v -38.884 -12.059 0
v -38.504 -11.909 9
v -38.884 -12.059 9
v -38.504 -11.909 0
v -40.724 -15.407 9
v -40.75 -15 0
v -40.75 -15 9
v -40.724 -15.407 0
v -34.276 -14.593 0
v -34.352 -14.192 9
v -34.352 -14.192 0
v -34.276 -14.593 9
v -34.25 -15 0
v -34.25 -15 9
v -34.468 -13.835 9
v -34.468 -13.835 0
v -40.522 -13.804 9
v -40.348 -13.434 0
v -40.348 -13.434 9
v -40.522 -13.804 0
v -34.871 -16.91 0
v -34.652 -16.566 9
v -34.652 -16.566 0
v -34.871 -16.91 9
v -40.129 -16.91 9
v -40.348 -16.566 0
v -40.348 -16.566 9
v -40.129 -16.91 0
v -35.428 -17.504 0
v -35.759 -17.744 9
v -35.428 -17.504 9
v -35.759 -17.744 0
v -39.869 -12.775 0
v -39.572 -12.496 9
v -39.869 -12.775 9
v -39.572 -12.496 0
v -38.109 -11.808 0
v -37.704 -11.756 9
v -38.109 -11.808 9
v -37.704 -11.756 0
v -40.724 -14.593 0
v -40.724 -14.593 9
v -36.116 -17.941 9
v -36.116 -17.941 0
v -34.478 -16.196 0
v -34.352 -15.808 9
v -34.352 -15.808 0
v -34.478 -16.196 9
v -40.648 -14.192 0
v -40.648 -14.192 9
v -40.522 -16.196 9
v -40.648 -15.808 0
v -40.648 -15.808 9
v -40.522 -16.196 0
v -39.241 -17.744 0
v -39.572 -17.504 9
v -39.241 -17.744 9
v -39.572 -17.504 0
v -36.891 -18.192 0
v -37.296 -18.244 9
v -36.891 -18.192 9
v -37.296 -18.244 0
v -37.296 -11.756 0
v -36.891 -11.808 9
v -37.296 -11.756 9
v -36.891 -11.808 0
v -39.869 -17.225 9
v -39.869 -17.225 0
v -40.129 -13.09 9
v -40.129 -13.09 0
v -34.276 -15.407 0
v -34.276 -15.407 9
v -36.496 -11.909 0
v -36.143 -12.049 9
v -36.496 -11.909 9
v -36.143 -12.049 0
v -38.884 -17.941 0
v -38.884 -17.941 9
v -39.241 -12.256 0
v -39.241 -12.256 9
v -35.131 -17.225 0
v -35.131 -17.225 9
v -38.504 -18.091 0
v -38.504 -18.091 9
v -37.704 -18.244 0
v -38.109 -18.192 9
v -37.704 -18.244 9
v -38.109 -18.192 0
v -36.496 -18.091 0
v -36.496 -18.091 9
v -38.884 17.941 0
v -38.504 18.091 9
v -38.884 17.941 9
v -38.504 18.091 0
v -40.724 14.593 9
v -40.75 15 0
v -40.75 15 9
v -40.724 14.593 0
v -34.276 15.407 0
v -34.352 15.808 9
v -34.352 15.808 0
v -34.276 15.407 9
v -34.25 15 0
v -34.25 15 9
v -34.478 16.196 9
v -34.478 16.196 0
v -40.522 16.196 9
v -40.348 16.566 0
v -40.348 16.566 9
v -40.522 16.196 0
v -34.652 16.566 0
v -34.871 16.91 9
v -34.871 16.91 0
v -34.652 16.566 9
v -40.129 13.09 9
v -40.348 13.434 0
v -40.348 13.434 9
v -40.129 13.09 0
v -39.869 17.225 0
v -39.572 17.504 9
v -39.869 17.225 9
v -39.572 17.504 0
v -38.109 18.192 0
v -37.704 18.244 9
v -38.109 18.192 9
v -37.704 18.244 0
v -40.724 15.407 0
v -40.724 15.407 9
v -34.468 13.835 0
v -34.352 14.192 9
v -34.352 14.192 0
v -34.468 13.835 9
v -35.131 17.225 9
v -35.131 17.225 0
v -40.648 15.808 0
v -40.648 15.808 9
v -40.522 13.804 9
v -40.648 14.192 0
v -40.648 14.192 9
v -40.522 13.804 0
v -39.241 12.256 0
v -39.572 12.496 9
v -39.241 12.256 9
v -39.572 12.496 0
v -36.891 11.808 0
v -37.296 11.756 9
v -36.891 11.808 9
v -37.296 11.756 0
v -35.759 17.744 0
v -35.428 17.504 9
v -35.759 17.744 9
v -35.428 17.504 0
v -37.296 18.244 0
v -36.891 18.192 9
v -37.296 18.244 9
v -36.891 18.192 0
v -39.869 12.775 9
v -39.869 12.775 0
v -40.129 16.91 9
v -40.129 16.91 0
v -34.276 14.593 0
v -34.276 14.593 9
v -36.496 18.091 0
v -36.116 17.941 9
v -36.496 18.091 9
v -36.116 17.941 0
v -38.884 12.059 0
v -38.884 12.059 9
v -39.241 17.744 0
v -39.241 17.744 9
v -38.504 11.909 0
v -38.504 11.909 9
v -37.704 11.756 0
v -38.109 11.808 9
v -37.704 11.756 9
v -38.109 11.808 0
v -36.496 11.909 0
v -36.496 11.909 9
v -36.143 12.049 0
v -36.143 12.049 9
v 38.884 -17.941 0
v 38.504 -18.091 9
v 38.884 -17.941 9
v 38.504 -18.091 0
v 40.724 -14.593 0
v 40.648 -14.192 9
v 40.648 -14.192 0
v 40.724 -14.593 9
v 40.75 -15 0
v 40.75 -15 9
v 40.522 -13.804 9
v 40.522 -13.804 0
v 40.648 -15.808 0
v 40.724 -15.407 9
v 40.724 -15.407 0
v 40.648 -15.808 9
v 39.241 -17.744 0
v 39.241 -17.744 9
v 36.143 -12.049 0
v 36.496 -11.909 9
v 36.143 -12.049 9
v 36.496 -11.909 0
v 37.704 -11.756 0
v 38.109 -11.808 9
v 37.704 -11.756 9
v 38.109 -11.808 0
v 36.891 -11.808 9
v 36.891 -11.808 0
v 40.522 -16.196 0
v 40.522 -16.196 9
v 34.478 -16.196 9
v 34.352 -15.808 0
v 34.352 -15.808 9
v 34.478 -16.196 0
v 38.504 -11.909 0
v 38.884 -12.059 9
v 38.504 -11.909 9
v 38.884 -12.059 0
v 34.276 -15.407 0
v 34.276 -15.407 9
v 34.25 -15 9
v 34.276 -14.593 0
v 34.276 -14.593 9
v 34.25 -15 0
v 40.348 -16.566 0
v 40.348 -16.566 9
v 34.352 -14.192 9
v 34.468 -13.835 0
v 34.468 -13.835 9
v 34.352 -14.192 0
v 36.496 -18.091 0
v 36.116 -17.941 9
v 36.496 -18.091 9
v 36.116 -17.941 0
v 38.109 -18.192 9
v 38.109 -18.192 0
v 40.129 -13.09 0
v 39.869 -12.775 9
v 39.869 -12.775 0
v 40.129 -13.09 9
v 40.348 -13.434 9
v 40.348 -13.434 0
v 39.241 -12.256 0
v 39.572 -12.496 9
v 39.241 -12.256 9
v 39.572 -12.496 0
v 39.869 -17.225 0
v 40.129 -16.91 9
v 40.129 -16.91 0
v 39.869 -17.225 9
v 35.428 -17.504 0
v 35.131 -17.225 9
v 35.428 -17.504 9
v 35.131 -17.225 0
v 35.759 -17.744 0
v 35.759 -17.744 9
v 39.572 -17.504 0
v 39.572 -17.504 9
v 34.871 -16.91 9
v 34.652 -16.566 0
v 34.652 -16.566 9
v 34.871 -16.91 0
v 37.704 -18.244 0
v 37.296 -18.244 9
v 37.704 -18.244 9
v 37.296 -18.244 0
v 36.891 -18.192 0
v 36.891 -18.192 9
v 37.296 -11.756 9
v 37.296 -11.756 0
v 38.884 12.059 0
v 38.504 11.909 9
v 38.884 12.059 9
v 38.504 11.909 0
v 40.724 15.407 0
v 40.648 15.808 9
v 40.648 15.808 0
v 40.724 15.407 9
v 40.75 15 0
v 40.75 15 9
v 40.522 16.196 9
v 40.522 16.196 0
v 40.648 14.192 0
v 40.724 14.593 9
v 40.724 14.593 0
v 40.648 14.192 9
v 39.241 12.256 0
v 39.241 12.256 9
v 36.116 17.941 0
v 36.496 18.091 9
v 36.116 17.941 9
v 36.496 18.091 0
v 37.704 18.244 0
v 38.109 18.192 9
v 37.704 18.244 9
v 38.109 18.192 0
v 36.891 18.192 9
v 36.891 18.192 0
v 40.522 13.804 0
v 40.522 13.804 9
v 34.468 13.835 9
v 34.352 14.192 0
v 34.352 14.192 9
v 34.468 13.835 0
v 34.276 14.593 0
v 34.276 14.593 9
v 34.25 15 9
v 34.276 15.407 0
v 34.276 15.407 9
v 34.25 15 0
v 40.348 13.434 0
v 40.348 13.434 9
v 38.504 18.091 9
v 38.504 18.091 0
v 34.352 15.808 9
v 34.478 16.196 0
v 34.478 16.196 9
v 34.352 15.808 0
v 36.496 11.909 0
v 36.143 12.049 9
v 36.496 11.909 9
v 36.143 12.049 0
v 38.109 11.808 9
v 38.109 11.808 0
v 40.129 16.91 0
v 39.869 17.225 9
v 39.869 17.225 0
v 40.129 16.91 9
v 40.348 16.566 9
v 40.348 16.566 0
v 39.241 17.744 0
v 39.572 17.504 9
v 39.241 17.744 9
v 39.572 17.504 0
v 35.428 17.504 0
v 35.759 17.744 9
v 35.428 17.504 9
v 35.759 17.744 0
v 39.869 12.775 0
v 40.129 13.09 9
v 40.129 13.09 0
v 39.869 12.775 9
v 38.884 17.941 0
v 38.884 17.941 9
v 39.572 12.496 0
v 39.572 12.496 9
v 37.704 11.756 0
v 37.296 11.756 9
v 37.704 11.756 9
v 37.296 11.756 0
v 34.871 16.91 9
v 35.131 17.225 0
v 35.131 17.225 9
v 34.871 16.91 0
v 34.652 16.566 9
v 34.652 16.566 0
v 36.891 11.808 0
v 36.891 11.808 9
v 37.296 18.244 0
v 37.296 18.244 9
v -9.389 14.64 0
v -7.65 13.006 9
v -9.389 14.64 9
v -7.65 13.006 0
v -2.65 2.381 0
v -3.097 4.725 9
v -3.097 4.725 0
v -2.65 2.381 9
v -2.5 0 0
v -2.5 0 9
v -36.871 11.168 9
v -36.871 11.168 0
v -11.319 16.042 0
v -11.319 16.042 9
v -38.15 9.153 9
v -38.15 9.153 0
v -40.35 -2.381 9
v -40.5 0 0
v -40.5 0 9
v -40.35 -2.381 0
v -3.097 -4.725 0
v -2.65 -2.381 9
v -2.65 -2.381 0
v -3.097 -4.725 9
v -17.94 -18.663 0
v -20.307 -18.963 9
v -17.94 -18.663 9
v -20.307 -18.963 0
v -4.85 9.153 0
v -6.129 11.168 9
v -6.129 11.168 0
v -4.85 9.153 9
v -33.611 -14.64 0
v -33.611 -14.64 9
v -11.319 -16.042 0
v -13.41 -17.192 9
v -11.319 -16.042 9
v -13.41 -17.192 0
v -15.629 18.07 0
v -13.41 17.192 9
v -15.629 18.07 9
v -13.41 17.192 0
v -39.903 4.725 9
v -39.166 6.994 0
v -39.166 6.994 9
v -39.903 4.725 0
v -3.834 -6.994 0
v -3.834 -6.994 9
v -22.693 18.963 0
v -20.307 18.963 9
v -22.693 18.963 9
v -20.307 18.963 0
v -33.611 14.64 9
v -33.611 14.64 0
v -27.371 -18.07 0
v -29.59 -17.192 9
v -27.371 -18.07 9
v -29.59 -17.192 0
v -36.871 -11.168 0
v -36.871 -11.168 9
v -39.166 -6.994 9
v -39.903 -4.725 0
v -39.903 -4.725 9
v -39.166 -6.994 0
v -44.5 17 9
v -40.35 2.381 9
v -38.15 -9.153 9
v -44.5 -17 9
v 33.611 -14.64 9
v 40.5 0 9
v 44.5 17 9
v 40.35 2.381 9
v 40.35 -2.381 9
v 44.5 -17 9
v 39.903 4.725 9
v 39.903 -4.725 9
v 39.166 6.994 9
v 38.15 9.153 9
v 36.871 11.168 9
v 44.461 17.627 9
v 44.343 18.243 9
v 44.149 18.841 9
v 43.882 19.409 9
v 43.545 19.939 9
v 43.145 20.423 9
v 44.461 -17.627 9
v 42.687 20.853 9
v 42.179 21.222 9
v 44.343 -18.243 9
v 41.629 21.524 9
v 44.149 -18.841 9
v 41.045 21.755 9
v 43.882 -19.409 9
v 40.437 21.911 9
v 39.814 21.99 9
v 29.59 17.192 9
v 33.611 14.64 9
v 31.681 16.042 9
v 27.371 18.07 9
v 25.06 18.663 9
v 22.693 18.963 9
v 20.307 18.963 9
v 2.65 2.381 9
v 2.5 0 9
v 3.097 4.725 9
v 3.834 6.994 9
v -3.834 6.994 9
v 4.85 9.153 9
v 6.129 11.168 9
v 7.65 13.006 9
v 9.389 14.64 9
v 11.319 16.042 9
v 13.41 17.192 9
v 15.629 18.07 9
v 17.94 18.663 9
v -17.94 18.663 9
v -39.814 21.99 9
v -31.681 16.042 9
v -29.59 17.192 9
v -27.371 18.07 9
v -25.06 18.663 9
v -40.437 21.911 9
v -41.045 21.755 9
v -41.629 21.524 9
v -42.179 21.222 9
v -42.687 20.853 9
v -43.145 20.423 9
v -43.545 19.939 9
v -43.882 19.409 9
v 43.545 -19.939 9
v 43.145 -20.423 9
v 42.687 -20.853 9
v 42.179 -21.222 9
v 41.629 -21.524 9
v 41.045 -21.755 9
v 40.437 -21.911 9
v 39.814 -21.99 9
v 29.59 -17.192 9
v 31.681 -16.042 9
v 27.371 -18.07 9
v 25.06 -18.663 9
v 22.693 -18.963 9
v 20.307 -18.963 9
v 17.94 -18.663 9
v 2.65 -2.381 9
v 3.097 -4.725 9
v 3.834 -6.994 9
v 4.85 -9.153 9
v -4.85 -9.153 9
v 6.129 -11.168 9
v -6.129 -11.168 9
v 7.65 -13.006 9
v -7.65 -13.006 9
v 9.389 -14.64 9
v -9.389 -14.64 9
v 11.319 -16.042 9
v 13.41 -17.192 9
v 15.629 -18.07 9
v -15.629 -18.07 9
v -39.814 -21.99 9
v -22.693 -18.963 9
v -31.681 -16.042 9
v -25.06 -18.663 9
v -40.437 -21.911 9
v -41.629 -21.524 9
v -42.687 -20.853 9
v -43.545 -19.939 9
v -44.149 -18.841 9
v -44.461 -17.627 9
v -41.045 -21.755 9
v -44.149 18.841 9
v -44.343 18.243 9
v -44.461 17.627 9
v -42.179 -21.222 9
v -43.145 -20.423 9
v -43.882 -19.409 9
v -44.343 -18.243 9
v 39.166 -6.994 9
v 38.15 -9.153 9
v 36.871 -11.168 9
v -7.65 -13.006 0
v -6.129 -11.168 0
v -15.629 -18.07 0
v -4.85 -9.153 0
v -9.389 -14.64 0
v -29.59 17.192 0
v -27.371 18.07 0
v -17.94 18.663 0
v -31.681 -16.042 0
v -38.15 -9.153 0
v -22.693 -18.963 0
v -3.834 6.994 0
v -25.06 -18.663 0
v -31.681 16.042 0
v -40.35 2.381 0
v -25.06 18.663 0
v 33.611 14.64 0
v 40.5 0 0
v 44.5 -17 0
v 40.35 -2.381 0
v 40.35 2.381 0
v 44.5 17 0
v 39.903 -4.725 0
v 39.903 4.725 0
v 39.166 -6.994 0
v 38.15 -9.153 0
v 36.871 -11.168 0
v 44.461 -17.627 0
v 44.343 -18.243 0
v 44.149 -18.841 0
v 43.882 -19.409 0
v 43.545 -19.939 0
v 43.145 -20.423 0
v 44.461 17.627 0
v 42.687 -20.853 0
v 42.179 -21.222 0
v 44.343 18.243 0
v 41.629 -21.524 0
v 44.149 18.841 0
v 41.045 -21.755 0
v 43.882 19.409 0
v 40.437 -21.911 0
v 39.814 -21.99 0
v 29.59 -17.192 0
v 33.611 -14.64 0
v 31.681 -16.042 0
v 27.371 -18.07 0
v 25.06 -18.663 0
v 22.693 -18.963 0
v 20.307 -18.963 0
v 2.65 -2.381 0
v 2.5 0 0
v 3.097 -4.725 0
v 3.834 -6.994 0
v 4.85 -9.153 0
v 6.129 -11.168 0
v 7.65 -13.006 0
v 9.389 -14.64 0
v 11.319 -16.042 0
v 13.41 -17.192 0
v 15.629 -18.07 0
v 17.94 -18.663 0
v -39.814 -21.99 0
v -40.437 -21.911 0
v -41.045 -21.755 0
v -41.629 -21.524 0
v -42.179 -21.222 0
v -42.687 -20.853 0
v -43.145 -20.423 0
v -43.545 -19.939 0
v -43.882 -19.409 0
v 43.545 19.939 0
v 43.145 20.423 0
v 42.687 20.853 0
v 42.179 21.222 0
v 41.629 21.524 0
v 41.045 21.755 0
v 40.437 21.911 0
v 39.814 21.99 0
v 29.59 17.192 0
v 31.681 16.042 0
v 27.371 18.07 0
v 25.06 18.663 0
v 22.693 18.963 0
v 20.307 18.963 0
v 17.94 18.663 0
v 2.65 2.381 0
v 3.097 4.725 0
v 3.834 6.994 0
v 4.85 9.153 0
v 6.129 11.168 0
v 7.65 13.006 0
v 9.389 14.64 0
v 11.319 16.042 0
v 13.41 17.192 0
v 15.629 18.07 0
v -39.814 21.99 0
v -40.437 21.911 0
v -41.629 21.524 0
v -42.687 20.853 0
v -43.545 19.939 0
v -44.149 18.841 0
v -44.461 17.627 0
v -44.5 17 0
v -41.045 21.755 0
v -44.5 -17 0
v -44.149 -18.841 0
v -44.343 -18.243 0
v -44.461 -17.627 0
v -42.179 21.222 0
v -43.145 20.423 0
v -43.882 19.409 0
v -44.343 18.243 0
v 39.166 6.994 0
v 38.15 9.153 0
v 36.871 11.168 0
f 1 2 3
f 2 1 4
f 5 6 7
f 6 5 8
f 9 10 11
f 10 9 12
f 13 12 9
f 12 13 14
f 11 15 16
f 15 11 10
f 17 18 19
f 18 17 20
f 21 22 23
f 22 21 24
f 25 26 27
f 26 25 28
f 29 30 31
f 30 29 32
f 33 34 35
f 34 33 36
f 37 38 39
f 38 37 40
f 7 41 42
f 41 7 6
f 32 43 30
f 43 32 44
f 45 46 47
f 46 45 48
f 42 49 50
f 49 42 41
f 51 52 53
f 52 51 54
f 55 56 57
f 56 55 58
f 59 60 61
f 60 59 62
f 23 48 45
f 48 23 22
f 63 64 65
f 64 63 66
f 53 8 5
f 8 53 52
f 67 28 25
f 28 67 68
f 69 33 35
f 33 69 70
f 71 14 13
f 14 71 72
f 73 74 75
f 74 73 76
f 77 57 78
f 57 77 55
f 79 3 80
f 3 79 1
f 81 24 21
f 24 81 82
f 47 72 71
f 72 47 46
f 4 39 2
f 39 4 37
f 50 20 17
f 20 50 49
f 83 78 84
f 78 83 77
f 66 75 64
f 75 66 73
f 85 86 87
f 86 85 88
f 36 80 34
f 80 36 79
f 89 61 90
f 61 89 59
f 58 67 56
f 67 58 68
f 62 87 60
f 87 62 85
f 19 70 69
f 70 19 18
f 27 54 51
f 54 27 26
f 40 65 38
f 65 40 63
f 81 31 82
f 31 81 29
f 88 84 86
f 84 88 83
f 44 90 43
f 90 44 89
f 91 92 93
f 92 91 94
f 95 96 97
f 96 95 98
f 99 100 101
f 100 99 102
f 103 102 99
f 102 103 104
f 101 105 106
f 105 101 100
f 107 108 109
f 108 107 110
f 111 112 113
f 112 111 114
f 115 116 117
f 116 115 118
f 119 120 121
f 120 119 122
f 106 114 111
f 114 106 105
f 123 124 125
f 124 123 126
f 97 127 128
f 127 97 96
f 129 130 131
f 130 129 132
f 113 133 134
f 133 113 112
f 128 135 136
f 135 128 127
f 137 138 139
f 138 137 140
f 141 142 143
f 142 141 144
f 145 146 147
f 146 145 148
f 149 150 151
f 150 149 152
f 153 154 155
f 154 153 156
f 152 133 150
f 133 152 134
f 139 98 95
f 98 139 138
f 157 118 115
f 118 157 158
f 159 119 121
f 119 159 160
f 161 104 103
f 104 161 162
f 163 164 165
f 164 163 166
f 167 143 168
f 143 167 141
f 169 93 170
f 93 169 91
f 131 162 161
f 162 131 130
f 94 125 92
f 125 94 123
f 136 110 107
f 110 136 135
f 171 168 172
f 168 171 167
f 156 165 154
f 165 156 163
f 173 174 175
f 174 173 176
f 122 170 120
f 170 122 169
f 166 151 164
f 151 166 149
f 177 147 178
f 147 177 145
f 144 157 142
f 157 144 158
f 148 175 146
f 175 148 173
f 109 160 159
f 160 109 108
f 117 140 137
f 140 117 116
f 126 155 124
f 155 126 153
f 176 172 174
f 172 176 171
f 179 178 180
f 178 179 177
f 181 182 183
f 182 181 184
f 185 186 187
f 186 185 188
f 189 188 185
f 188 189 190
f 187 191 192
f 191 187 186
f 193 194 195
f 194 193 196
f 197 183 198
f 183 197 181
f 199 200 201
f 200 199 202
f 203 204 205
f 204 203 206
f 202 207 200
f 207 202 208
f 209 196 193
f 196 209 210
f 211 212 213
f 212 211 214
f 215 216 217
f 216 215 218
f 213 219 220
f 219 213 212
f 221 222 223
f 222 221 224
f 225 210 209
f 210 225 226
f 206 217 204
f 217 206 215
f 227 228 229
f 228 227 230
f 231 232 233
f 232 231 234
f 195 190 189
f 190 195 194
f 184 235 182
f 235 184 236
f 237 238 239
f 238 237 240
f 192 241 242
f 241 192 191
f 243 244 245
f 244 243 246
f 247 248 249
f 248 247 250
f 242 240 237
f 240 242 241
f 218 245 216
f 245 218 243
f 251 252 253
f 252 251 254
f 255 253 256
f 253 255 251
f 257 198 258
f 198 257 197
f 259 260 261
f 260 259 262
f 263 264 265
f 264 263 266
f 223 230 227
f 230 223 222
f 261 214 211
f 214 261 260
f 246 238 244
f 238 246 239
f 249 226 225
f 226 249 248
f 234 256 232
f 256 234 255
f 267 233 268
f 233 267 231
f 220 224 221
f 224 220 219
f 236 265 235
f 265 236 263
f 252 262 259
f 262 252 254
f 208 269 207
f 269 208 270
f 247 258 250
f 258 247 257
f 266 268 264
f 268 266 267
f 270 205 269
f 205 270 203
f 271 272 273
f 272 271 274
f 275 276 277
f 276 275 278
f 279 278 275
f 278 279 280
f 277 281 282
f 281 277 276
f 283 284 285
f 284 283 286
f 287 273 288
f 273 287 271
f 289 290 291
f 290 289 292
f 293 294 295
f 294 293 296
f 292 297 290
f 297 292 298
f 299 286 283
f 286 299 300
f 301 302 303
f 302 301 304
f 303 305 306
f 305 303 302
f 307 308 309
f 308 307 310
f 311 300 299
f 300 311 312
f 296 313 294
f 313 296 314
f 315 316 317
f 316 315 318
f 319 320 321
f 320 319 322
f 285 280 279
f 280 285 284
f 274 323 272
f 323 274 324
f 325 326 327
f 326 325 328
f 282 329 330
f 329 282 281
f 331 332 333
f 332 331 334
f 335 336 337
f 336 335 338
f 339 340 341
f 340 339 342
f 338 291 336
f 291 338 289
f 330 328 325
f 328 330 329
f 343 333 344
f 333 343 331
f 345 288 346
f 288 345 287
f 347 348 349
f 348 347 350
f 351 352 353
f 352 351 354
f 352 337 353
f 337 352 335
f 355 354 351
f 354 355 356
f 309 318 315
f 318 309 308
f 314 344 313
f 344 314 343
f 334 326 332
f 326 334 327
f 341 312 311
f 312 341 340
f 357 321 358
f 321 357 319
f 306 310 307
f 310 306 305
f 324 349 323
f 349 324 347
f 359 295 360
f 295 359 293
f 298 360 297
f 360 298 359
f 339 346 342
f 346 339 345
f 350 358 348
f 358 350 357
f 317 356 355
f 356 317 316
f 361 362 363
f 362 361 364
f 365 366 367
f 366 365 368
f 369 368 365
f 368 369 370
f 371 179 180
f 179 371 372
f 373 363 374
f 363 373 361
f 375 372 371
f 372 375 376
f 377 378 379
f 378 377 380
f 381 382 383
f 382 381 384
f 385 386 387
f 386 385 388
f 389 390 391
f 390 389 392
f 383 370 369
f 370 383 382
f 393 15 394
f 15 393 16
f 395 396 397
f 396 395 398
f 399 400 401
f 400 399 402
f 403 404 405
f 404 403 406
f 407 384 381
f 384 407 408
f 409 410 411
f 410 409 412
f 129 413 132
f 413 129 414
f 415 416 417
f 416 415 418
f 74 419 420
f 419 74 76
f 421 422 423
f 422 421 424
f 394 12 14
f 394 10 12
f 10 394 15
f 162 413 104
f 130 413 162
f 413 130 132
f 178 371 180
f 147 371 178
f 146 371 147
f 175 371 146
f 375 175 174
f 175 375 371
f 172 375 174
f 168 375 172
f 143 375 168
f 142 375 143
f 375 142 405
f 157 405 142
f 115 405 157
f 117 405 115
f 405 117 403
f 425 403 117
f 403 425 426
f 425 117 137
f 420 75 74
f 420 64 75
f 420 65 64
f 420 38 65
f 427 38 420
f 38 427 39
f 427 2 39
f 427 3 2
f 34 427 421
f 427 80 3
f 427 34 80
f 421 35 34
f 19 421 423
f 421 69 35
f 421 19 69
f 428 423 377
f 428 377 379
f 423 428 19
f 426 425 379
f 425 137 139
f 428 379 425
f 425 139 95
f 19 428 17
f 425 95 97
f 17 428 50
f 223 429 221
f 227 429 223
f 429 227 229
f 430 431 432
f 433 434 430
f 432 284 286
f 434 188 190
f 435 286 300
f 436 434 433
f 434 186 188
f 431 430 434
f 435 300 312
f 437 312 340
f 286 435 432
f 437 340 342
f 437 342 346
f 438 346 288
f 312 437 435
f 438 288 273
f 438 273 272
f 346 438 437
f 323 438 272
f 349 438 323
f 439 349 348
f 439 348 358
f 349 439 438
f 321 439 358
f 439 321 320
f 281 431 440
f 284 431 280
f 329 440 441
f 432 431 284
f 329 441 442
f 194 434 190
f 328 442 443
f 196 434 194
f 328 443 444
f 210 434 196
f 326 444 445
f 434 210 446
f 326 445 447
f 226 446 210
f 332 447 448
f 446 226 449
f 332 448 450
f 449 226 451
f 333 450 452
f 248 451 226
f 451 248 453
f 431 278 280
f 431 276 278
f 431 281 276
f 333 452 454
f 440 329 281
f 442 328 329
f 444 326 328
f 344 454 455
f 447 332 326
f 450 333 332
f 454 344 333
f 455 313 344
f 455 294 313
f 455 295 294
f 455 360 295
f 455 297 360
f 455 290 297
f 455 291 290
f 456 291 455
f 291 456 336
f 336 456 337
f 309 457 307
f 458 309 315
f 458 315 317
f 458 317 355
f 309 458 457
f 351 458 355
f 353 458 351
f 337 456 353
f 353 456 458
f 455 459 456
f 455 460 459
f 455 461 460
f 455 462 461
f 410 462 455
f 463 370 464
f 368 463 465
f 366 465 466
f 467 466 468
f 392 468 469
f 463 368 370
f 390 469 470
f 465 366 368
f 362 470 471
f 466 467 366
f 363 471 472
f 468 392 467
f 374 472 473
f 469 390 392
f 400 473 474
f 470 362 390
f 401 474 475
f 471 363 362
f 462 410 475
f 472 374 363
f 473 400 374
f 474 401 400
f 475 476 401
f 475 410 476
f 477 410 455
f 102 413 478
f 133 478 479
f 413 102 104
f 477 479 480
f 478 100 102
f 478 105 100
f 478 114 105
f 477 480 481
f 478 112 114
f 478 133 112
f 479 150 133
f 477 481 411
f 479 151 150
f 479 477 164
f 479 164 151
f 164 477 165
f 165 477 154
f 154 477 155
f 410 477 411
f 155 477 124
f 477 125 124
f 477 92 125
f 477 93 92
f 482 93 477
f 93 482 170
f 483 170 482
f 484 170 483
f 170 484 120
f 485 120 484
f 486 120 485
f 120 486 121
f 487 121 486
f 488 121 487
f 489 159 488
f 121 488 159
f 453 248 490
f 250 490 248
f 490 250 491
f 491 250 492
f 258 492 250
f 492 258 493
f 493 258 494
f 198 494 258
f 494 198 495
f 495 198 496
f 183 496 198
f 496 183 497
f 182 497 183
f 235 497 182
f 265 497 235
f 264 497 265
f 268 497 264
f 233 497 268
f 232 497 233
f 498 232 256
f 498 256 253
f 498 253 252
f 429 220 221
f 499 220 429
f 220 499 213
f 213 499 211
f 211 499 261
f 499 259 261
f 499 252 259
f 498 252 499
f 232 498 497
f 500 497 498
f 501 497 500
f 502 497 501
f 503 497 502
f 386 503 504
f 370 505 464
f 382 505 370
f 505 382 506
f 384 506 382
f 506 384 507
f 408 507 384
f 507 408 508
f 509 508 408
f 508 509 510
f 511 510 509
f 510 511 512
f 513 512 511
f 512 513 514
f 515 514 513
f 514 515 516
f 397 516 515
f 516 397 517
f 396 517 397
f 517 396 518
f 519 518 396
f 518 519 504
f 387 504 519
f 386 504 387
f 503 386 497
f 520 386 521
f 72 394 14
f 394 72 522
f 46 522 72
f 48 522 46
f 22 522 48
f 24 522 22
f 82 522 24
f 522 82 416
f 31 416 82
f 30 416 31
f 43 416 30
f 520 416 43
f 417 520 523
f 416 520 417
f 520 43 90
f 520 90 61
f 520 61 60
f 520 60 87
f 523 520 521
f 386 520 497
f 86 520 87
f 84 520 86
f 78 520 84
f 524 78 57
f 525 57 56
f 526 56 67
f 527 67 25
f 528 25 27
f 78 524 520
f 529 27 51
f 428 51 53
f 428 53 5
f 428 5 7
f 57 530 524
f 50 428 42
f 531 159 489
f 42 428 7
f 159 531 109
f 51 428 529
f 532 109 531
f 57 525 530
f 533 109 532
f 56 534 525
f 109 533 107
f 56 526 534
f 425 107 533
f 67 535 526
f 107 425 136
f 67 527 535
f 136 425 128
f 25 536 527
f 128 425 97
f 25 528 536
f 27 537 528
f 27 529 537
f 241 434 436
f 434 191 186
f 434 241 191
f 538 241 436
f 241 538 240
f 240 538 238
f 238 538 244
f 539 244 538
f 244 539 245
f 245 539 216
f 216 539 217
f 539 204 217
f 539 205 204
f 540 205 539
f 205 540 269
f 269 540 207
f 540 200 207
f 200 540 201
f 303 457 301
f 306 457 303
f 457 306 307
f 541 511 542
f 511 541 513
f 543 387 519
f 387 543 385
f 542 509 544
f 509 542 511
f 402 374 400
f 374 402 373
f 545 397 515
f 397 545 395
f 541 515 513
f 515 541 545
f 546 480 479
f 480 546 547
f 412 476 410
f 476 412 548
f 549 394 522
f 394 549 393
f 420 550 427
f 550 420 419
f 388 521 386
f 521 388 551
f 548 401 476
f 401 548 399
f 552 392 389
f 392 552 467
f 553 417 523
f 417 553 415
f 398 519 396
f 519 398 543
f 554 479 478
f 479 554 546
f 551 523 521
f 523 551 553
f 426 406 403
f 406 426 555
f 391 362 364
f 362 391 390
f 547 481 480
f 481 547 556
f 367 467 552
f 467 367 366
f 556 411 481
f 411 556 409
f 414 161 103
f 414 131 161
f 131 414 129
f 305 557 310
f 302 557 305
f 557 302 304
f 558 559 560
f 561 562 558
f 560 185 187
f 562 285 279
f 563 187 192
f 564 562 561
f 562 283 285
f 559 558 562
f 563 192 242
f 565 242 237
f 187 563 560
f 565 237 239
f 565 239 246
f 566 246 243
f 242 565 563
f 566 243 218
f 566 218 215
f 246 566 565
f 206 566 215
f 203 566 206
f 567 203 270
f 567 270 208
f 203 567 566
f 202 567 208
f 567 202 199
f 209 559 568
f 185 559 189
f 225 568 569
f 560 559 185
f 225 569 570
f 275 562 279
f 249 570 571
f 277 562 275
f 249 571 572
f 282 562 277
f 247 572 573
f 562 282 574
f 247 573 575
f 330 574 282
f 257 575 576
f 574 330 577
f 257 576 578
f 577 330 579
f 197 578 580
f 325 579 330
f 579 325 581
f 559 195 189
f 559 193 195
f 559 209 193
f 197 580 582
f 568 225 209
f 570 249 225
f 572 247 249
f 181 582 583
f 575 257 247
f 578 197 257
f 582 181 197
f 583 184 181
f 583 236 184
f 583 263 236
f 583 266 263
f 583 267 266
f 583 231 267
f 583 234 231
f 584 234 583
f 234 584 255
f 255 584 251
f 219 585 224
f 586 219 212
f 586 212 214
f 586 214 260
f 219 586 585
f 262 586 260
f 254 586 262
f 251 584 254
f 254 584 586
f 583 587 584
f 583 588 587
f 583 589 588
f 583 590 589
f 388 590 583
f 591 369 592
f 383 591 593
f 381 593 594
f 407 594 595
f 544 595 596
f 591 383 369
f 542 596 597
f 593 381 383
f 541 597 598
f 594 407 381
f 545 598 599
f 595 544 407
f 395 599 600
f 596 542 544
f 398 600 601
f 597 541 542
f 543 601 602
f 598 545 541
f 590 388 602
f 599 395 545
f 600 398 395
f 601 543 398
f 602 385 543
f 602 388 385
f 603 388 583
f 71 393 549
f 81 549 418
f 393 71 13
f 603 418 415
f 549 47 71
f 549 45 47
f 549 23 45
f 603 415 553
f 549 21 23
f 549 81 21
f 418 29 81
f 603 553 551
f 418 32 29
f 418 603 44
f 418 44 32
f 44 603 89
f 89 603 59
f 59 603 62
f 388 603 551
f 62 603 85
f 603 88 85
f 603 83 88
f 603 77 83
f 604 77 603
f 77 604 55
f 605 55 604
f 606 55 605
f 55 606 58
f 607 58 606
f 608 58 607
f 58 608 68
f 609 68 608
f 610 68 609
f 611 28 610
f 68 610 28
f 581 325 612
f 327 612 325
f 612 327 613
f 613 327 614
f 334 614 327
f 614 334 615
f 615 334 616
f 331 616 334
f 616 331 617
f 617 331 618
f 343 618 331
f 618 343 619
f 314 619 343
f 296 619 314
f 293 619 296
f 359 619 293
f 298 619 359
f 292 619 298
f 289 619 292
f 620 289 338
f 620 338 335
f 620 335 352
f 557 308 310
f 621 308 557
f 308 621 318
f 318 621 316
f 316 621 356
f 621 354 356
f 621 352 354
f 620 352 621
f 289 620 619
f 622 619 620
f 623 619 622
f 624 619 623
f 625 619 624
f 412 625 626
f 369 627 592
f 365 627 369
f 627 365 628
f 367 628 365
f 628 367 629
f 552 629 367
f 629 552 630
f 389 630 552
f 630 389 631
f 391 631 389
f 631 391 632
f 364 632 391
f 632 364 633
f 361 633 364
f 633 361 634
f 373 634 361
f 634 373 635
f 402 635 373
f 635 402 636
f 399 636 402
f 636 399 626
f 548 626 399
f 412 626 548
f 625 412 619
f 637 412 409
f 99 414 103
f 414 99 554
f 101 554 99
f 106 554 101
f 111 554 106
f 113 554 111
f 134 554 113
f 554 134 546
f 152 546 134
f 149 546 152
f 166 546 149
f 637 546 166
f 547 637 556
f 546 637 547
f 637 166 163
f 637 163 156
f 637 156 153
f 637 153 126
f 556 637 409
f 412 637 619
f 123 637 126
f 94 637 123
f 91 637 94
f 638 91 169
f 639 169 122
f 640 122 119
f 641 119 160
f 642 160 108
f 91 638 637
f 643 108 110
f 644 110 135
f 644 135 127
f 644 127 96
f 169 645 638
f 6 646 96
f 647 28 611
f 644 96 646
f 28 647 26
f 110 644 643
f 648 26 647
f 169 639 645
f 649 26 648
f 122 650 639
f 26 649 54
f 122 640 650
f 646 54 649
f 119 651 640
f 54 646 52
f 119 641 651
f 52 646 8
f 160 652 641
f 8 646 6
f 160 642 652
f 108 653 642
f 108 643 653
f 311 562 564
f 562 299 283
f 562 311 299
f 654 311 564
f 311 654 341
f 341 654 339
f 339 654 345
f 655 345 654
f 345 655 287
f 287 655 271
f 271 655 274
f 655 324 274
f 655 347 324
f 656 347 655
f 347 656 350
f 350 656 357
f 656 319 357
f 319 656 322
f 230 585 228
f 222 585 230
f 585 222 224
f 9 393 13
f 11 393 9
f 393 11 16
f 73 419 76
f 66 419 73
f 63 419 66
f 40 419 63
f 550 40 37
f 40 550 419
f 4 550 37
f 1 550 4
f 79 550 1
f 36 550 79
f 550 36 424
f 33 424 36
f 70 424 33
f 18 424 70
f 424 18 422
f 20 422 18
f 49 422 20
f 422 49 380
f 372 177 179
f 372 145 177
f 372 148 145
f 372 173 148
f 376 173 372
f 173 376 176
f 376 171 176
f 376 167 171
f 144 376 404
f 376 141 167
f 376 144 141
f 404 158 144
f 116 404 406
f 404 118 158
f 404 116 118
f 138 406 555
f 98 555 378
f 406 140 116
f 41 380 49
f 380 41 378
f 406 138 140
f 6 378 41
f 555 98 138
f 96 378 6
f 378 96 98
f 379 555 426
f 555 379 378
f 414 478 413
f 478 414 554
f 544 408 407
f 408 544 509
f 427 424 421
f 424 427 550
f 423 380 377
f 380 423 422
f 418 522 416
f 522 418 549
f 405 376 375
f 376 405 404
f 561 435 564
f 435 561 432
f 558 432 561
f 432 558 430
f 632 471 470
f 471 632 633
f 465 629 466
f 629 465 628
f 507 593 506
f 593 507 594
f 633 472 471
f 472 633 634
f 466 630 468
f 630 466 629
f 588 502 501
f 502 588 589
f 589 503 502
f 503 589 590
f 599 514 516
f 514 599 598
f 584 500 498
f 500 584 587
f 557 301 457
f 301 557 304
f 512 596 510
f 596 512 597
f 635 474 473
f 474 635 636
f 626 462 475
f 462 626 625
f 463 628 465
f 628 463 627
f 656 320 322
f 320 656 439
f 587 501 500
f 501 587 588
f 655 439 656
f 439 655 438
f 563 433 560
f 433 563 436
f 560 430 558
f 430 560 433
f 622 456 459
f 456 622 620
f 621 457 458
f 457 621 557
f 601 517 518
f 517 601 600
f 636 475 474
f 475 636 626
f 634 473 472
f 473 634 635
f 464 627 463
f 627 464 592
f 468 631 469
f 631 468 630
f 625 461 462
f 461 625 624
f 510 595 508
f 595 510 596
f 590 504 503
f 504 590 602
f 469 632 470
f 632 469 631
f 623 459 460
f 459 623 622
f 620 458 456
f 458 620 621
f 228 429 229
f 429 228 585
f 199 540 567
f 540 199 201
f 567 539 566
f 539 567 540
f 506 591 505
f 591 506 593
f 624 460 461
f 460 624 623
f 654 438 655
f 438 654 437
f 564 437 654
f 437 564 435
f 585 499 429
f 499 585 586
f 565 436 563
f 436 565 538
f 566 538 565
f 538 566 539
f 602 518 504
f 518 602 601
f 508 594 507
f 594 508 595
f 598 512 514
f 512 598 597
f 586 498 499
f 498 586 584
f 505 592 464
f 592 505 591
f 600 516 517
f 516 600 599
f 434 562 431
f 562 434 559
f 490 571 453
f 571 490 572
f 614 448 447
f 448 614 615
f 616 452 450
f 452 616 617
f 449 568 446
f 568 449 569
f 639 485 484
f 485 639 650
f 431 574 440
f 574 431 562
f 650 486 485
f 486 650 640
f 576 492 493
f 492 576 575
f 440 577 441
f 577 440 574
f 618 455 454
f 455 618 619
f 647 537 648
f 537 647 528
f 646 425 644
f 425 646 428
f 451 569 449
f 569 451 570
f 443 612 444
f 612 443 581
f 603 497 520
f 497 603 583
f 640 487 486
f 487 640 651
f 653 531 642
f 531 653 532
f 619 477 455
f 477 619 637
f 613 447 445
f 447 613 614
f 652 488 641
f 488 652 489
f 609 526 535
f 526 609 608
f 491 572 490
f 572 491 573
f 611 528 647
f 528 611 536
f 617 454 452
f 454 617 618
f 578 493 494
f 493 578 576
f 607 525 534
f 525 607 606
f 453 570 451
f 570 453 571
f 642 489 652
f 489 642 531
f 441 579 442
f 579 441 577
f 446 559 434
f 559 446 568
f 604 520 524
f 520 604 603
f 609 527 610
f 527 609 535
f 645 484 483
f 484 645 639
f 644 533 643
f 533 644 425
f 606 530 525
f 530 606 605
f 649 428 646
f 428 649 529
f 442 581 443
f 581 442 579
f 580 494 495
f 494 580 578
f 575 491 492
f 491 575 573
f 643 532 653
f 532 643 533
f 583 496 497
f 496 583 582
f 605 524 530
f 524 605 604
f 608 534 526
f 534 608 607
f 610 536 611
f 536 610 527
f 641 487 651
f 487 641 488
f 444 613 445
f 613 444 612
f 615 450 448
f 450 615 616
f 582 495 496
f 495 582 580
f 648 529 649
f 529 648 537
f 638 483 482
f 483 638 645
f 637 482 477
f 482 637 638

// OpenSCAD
$fn = 50;


difference() {
	union() {
		hull() {
			translate(v = [-39.5000000000, 17.0000000000, 0]) {
				cylinder(h = 9, r = 5);
			}
			translate(v = [39.5000000000, 17.0000000000, 0]) {
				cylinder(h = 9, r = 5);
			}
			translate(v = [-39.5000000000, -17.0000000000, 0]) {
				cylinder(h = 9, r = 5);
			}
			translate(v = [39.5000000000, -17.0000000000, 0]) {
				cylinder(h = 9, r = 5);
			}
		}
	}
	union() {
		#translate(v = [-37.5000000000, -15.0000000000, -100.0000000000]) {
			cylinder(h = 200, r = 3.2500000000);
		}
		#translate(v = [-37.5000000000, 15.0000000000, -100.0000000000]) {
			cylinder(h = 200, r = 3.2500000000);
		}
		#translate(v = [37.5000000000, -15.0000000000, -100.0000000000]) {
			cylinder(h = 200, r = 3.2500000000);
		}
		#translate(v = [37.5000000000, 15.0000000000, -100.0000000000]) {
			cylinder(h = 200, r = 3.2500000000);
		}
		#translate(v = [-21.5000000000, 0, 0]) {
			cylinder(h = 9, r = 19.0000000000);
		}
		#translate(v = [21.5000000000, 0, 0]) {
			cylinder(h = 9, r = 19.0000000000);
		}
	}
}
